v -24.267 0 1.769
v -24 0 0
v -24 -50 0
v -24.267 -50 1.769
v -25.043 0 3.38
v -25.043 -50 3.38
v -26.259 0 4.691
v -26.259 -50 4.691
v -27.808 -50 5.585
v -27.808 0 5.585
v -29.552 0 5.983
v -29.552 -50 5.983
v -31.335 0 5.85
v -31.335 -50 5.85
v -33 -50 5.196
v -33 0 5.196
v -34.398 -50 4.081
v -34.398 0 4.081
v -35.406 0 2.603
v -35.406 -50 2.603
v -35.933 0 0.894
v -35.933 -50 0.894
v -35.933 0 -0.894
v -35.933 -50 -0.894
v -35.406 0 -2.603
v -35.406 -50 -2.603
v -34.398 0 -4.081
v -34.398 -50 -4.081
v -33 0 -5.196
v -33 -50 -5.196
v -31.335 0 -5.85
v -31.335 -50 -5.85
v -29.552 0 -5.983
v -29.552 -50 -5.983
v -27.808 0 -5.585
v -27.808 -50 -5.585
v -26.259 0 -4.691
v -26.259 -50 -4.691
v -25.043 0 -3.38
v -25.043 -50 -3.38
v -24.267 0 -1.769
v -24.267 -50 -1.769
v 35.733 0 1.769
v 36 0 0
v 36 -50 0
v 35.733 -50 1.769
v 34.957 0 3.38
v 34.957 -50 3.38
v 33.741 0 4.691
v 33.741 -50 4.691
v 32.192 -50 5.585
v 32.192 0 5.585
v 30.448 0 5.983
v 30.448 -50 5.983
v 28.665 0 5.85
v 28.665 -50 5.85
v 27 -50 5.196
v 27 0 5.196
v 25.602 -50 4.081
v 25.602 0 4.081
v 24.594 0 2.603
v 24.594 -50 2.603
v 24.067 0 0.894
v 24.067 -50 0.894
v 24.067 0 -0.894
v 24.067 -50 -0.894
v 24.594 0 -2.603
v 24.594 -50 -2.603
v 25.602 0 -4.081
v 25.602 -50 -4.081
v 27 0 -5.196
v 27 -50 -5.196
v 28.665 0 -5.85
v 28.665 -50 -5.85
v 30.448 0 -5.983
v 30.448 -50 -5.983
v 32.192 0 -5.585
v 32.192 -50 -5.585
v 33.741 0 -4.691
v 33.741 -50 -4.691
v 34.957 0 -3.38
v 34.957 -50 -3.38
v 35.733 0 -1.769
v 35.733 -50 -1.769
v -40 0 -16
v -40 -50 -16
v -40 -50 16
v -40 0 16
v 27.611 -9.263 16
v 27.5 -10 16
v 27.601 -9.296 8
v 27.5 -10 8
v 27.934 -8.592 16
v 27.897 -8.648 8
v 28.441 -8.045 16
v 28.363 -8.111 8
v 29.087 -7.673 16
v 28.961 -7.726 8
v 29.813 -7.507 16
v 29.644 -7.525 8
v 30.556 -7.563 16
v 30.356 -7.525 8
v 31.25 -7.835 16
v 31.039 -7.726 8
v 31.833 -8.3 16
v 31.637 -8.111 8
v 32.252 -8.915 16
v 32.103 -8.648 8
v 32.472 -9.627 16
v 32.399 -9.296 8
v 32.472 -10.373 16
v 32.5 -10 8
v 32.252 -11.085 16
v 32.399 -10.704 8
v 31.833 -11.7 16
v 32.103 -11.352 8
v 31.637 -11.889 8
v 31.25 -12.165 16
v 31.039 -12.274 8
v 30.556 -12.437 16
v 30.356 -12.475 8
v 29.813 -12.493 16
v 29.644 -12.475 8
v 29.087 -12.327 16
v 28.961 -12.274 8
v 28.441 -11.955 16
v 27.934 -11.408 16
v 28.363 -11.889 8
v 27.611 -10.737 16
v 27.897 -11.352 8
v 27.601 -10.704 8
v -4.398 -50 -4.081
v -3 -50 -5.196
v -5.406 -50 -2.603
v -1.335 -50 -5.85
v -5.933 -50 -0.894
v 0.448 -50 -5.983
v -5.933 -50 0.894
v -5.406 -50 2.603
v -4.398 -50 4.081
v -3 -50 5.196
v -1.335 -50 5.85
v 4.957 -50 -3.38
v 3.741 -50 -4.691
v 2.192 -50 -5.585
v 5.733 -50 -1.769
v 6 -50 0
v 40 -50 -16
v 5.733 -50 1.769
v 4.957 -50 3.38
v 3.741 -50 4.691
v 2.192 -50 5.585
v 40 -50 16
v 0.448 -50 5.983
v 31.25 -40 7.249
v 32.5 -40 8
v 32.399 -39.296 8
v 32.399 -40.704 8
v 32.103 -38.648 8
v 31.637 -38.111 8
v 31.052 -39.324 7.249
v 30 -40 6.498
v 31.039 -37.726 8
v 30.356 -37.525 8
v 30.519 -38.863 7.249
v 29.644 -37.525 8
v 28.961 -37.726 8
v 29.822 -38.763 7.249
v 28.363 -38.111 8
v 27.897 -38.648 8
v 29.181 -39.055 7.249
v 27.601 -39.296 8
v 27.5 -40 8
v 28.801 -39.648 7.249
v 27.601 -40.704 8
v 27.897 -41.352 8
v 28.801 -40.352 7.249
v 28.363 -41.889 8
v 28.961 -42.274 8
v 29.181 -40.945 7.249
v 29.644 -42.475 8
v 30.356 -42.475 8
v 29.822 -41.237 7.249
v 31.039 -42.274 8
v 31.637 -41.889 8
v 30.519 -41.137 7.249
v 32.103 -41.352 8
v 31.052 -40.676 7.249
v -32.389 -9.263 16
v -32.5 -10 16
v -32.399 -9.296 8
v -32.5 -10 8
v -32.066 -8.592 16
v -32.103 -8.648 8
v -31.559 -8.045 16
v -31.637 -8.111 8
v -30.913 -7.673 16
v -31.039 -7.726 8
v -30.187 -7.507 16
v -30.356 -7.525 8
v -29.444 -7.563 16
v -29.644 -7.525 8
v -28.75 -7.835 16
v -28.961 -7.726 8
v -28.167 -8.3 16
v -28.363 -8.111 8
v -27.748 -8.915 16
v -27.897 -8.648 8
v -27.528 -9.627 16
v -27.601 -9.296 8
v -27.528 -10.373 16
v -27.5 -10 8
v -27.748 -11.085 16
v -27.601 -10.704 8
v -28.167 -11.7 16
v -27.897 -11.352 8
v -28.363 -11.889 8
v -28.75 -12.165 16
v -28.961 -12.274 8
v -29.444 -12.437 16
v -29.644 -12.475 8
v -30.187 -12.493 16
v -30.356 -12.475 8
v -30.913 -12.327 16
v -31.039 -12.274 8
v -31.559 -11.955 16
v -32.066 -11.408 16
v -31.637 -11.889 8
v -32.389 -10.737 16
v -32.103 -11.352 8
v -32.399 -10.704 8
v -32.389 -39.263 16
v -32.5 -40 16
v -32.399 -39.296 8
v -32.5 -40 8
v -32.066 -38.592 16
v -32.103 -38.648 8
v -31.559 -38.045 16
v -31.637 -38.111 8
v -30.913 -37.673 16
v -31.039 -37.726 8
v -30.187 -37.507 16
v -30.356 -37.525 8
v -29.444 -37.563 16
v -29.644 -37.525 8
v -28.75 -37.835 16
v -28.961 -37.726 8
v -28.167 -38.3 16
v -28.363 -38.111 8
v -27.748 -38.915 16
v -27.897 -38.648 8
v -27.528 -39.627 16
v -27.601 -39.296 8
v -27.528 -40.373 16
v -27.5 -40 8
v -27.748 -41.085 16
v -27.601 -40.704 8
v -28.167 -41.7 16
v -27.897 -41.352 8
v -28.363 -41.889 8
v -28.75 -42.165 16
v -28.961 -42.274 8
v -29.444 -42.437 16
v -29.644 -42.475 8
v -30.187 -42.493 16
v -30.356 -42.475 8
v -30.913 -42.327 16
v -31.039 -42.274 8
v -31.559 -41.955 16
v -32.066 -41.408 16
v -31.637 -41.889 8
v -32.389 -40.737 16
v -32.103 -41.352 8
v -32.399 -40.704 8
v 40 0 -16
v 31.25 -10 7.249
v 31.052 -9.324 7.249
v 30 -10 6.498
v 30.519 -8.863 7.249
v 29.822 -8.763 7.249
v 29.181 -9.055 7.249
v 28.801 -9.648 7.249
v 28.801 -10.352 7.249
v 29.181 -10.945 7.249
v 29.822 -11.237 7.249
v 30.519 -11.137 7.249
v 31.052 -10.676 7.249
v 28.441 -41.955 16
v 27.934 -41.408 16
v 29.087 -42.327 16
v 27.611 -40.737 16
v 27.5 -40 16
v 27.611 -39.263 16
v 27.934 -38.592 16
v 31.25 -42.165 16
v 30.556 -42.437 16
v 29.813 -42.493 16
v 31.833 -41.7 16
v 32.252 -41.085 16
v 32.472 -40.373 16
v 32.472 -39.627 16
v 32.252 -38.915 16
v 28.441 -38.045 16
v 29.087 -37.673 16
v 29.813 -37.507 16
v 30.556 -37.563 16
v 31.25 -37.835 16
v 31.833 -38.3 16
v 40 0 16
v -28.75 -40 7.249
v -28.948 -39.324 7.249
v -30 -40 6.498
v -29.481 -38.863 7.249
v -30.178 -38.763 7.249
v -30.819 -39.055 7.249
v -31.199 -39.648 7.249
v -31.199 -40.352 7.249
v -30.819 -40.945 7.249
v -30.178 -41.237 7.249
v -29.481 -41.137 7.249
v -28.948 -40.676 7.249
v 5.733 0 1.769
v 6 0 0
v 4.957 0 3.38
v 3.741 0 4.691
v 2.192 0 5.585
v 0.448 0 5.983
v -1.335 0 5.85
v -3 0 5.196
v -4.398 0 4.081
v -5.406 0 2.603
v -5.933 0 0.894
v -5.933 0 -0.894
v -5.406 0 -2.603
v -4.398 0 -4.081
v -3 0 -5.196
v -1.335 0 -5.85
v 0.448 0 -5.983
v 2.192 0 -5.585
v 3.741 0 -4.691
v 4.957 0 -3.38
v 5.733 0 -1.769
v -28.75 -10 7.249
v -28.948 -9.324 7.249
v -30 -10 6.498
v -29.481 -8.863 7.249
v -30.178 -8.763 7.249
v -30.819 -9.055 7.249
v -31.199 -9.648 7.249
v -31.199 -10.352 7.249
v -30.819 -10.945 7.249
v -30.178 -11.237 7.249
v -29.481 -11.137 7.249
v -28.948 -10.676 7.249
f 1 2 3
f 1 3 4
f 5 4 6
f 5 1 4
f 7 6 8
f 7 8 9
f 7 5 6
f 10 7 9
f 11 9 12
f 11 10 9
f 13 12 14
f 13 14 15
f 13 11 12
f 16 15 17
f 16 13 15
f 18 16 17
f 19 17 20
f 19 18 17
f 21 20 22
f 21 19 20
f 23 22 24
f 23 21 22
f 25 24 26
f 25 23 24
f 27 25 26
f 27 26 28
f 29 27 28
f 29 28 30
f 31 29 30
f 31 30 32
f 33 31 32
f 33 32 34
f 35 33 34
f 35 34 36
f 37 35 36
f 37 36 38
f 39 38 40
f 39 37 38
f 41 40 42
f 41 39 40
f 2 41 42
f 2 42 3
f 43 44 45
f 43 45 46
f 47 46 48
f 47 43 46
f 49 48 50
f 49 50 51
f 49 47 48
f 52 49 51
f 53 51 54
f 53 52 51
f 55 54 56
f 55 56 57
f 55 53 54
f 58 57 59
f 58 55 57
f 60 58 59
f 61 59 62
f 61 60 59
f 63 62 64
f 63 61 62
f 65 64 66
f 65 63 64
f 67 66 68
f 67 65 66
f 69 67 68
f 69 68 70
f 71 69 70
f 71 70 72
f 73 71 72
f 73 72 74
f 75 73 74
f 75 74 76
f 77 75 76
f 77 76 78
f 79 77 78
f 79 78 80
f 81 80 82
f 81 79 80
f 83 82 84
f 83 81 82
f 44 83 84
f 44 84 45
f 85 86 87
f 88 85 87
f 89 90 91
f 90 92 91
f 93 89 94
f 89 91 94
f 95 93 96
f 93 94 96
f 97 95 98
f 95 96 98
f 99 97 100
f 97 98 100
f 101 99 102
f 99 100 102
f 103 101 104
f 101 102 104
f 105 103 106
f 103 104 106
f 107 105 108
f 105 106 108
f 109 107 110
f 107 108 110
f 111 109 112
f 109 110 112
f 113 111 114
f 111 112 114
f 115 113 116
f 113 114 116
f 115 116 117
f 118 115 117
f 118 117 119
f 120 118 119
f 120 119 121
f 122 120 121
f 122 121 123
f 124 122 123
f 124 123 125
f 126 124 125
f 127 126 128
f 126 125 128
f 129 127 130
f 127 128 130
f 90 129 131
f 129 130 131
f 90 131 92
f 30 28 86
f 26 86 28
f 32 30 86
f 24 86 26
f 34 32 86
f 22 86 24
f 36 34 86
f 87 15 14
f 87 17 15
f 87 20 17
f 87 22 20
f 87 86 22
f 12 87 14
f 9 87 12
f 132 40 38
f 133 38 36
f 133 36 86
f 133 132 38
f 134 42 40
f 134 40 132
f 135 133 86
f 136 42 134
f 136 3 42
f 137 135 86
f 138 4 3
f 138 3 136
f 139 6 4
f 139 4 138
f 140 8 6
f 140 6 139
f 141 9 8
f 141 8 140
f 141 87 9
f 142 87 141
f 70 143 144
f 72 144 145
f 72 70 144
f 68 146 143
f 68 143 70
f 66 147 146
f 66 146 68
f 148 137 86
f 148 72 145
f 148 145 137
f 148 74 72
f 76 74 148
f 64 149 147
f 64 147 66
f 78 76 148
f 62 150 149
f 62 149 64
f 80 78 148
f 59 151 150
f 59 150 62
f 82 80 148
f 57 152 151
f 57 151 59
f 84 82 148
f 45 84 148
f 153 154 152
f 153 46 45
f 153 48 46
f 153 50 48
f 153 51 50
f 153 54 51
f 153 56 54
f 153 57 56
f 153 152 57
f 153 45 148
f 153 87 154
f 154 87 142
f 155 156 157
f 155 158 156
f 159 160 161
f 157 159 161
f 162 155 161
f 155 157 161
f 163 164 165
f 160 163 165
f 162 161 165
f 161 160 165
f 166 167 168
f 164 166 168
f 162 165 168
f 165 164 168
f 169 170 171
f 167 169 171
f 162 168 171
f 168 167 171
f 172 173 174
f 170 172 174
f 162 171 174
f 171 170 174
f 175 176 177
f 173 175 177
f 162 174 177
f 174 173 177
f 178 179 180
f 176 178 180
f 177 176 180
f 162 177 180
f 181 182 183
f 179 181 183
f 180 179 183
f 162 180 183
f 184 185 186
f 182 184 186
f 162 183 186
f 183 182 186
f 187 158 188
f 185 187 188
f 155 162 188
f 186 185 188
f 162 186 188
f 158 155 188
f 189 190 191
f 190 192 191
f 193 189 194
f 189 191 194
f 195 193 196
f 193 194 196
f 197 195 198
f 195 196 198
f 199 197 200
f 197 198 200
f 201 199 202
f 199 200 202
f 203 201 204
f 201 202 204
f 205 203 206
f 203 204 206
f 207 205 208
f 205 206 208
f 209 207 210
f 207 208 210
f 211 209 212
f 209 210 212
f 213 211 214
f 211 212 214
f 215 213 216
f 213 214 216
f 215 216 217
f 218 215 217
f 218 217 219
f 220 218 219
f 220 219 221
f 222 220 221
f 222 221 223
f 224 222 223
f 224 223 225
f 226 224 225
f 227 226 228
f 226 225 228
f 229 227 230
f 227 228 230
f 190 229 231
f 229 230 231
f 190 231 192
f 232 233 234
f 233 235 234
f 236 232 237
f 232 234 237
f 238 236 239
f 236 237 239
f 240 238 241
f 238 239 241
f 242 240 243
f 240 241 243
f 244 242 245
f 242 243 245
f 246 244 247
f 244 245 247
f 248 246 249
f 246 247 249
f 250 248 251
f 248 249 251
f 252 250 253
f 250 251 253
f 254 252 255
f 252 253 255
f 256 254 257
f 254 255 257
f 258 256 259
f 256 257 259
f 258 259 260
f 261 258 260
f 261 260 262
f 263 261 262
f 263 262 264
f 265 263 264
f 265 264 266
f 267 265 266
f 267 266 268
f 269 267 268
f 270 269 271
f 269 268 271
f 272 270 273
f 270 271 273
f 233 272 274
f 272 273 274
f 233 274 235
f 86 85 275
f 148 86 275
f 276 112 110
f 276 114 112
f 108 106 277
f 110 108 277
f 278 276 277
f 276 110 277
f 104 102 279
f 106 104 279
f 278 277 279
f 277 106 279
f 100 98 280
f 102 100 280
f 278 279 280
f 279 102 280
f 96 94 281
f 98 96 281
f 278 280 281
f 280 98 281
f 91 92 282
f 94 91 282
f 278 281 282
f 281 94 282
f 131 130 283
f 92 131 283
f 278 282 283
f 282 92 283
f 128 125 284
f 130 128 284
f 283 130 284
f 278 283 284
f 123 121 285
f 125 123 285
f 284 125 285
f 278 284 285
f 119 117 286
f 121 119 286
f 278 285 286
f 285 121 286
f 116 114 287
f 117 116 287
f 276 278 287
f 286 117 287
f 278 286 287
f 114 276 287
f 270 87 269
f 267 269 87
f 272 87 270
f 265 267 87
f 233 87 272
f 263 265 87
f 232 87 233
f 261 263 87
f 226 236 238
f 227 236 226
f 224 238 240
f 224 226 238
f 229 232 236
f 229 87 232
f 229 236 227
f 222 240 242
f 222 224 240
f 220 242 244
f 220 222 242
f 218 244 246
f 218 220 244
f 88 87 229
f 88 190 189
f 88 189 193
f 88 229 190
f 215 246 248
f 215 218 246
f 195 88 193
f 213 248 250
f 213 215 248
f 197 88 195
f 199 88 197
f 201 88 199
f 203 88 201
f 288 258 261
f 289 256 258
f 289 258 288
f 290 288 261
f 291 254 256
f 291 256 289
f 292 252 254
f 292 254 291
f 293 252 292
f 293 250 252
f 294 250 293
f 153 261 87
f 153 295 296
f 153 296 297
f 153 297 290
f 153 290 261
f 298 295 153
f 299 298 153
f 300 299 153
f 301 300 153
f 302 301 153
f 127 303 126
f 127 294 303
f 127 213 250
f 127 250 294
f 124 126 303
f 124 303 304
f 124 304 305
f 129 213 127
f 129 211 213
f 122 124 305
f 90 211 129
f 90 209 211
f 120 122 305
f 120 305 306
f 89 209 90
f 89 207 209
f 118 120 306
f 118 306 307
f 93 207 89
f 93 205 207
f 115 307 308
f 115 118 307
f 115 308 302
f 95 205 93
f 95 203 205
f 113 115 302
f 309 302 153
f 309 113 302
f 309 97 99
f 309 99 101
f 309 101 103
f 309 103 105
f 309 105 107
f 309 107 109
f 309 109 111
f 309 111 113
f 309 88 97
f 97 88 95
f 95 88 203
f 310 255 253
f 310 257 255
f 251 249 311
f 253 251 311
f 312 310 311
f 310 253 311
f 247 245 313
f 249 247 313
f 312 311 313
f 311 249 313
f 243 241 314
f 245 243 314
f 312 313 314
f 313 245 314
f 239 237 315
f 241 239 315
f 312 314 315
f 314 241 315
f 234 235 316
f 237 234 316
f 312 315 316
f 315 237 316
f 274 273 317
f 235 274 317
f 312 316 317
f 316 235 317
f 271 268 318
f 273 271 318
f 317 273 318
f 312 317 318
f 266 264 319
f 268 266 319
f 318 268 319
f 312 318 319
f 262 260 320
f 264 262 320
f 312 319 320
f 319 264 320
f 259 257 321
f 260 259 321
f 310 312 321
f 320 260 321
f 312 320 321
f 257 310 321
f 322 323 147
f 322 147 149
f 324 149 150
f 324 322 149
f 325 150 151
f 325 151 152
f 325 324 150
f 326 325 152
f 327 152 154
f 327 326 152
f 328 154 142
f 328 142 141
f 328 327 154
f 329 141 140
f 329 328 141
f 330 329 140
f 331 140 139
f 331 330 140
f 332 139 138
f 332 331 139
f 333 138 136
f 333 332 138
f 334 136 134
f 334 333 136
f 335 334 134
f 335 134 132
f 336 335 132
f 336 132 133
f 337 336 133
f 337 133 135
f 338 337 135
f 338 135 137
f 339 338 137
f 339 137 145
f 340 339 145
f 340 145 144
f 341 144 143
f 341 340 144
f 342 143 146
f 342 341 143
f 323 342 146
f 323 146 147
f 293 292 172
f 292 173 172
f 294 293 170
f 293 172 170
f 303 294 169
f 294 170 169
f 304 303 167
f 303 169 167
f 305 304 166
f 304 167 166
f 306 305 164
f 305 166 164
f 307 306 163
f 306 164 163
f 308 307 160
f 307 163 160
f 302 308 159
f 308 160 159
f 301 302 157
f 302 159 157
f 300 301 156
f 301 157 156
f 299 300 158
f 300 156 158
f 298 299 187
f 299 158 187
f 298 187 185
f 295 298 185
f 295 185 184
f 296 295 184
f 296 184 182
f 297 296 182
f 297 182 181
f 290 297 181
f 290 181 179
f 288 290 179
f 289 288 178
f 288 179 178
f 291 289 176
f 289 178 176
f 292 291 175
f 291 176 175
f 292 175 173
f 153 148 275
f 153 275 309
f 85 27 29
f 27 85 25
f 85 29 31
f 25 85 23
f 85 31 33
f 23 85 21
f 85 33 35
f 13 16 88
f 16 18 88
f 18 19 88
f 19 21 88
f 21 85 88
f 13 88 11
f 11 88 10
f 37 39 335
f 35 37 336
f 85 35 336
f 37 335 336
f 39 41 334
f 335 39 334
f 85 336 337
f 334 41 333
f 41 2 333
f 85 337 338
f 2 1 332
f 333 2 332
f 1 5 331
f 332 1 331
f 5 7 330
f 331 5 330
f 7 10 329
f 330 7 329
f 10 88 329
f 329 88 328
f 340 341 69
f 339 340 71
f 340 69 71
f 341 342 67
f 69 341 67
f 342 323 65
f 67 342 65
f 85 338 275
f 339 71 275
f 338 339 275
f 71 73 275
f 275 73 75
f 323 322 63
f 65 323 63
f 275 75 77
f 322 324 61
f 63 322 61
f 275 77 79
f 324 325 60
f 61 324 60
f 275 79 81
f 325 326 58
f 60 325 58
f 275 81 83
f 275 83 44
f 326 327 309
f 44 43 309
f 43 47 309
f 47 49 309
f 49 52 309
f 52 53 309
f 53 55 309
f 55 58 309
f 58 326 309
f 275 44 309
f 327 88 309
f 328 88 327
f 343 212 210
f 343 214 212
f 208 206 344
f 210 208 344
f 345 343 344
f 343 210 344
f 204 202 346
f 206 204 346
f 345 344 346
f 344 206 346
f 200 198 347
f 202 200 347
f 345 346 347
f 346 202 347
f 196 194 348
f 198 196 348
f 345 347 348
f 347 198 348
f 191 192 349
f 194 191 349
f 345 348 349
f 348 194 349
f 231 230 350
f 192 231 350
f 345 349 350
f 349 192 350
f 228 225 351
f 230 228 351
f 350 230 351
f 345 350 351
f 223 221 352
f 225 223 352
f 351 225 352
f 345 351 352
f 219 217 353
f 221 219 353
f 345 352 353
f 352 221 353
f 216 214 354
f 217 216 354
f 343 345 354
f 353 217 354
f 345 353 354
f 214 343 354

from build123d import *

# Parameters (mm, degrees)
F0_W     = 80
F0_H     = 32
F0_R     = 6
F1_DEPTH = 50
F3_D     = 5
F3_DEPTH = 8
F3_TIP   = 1.5021515476


with BuildPart() as f1:
    # F0 (on Front) → F1 (new body)
    with BuildSketch(Plane.XZ):
        Rectangle(F0_W, F0_H)
        with Locations((-30, 0)):
            Circle(F0_R, mode=Mode.SUBTRACT)
        Circle(F0_R, mode=Mode.SUBTRACT)
        with Locations((30, 0)):
            Circle(F0_R, mode=Mode.SUBTRACT)
    extrude(amount=F1_DEPTH)

    # F3
    with Locations(Plane.XY.offset(16)):
        with Locations((-30, -40), (-30, -10), (30, -40), (30, -10)):
            Hole(F3_D / 2, depth=F3_DEPTH)
            with Locations((0, 0, -(F3_DEPTH + F3_TIP / 2))):  # 118° drill point
                Cone(0, F3_D / 2, F3_TIP, mode=Mode.SUBTRACT)


solid = f1.part
